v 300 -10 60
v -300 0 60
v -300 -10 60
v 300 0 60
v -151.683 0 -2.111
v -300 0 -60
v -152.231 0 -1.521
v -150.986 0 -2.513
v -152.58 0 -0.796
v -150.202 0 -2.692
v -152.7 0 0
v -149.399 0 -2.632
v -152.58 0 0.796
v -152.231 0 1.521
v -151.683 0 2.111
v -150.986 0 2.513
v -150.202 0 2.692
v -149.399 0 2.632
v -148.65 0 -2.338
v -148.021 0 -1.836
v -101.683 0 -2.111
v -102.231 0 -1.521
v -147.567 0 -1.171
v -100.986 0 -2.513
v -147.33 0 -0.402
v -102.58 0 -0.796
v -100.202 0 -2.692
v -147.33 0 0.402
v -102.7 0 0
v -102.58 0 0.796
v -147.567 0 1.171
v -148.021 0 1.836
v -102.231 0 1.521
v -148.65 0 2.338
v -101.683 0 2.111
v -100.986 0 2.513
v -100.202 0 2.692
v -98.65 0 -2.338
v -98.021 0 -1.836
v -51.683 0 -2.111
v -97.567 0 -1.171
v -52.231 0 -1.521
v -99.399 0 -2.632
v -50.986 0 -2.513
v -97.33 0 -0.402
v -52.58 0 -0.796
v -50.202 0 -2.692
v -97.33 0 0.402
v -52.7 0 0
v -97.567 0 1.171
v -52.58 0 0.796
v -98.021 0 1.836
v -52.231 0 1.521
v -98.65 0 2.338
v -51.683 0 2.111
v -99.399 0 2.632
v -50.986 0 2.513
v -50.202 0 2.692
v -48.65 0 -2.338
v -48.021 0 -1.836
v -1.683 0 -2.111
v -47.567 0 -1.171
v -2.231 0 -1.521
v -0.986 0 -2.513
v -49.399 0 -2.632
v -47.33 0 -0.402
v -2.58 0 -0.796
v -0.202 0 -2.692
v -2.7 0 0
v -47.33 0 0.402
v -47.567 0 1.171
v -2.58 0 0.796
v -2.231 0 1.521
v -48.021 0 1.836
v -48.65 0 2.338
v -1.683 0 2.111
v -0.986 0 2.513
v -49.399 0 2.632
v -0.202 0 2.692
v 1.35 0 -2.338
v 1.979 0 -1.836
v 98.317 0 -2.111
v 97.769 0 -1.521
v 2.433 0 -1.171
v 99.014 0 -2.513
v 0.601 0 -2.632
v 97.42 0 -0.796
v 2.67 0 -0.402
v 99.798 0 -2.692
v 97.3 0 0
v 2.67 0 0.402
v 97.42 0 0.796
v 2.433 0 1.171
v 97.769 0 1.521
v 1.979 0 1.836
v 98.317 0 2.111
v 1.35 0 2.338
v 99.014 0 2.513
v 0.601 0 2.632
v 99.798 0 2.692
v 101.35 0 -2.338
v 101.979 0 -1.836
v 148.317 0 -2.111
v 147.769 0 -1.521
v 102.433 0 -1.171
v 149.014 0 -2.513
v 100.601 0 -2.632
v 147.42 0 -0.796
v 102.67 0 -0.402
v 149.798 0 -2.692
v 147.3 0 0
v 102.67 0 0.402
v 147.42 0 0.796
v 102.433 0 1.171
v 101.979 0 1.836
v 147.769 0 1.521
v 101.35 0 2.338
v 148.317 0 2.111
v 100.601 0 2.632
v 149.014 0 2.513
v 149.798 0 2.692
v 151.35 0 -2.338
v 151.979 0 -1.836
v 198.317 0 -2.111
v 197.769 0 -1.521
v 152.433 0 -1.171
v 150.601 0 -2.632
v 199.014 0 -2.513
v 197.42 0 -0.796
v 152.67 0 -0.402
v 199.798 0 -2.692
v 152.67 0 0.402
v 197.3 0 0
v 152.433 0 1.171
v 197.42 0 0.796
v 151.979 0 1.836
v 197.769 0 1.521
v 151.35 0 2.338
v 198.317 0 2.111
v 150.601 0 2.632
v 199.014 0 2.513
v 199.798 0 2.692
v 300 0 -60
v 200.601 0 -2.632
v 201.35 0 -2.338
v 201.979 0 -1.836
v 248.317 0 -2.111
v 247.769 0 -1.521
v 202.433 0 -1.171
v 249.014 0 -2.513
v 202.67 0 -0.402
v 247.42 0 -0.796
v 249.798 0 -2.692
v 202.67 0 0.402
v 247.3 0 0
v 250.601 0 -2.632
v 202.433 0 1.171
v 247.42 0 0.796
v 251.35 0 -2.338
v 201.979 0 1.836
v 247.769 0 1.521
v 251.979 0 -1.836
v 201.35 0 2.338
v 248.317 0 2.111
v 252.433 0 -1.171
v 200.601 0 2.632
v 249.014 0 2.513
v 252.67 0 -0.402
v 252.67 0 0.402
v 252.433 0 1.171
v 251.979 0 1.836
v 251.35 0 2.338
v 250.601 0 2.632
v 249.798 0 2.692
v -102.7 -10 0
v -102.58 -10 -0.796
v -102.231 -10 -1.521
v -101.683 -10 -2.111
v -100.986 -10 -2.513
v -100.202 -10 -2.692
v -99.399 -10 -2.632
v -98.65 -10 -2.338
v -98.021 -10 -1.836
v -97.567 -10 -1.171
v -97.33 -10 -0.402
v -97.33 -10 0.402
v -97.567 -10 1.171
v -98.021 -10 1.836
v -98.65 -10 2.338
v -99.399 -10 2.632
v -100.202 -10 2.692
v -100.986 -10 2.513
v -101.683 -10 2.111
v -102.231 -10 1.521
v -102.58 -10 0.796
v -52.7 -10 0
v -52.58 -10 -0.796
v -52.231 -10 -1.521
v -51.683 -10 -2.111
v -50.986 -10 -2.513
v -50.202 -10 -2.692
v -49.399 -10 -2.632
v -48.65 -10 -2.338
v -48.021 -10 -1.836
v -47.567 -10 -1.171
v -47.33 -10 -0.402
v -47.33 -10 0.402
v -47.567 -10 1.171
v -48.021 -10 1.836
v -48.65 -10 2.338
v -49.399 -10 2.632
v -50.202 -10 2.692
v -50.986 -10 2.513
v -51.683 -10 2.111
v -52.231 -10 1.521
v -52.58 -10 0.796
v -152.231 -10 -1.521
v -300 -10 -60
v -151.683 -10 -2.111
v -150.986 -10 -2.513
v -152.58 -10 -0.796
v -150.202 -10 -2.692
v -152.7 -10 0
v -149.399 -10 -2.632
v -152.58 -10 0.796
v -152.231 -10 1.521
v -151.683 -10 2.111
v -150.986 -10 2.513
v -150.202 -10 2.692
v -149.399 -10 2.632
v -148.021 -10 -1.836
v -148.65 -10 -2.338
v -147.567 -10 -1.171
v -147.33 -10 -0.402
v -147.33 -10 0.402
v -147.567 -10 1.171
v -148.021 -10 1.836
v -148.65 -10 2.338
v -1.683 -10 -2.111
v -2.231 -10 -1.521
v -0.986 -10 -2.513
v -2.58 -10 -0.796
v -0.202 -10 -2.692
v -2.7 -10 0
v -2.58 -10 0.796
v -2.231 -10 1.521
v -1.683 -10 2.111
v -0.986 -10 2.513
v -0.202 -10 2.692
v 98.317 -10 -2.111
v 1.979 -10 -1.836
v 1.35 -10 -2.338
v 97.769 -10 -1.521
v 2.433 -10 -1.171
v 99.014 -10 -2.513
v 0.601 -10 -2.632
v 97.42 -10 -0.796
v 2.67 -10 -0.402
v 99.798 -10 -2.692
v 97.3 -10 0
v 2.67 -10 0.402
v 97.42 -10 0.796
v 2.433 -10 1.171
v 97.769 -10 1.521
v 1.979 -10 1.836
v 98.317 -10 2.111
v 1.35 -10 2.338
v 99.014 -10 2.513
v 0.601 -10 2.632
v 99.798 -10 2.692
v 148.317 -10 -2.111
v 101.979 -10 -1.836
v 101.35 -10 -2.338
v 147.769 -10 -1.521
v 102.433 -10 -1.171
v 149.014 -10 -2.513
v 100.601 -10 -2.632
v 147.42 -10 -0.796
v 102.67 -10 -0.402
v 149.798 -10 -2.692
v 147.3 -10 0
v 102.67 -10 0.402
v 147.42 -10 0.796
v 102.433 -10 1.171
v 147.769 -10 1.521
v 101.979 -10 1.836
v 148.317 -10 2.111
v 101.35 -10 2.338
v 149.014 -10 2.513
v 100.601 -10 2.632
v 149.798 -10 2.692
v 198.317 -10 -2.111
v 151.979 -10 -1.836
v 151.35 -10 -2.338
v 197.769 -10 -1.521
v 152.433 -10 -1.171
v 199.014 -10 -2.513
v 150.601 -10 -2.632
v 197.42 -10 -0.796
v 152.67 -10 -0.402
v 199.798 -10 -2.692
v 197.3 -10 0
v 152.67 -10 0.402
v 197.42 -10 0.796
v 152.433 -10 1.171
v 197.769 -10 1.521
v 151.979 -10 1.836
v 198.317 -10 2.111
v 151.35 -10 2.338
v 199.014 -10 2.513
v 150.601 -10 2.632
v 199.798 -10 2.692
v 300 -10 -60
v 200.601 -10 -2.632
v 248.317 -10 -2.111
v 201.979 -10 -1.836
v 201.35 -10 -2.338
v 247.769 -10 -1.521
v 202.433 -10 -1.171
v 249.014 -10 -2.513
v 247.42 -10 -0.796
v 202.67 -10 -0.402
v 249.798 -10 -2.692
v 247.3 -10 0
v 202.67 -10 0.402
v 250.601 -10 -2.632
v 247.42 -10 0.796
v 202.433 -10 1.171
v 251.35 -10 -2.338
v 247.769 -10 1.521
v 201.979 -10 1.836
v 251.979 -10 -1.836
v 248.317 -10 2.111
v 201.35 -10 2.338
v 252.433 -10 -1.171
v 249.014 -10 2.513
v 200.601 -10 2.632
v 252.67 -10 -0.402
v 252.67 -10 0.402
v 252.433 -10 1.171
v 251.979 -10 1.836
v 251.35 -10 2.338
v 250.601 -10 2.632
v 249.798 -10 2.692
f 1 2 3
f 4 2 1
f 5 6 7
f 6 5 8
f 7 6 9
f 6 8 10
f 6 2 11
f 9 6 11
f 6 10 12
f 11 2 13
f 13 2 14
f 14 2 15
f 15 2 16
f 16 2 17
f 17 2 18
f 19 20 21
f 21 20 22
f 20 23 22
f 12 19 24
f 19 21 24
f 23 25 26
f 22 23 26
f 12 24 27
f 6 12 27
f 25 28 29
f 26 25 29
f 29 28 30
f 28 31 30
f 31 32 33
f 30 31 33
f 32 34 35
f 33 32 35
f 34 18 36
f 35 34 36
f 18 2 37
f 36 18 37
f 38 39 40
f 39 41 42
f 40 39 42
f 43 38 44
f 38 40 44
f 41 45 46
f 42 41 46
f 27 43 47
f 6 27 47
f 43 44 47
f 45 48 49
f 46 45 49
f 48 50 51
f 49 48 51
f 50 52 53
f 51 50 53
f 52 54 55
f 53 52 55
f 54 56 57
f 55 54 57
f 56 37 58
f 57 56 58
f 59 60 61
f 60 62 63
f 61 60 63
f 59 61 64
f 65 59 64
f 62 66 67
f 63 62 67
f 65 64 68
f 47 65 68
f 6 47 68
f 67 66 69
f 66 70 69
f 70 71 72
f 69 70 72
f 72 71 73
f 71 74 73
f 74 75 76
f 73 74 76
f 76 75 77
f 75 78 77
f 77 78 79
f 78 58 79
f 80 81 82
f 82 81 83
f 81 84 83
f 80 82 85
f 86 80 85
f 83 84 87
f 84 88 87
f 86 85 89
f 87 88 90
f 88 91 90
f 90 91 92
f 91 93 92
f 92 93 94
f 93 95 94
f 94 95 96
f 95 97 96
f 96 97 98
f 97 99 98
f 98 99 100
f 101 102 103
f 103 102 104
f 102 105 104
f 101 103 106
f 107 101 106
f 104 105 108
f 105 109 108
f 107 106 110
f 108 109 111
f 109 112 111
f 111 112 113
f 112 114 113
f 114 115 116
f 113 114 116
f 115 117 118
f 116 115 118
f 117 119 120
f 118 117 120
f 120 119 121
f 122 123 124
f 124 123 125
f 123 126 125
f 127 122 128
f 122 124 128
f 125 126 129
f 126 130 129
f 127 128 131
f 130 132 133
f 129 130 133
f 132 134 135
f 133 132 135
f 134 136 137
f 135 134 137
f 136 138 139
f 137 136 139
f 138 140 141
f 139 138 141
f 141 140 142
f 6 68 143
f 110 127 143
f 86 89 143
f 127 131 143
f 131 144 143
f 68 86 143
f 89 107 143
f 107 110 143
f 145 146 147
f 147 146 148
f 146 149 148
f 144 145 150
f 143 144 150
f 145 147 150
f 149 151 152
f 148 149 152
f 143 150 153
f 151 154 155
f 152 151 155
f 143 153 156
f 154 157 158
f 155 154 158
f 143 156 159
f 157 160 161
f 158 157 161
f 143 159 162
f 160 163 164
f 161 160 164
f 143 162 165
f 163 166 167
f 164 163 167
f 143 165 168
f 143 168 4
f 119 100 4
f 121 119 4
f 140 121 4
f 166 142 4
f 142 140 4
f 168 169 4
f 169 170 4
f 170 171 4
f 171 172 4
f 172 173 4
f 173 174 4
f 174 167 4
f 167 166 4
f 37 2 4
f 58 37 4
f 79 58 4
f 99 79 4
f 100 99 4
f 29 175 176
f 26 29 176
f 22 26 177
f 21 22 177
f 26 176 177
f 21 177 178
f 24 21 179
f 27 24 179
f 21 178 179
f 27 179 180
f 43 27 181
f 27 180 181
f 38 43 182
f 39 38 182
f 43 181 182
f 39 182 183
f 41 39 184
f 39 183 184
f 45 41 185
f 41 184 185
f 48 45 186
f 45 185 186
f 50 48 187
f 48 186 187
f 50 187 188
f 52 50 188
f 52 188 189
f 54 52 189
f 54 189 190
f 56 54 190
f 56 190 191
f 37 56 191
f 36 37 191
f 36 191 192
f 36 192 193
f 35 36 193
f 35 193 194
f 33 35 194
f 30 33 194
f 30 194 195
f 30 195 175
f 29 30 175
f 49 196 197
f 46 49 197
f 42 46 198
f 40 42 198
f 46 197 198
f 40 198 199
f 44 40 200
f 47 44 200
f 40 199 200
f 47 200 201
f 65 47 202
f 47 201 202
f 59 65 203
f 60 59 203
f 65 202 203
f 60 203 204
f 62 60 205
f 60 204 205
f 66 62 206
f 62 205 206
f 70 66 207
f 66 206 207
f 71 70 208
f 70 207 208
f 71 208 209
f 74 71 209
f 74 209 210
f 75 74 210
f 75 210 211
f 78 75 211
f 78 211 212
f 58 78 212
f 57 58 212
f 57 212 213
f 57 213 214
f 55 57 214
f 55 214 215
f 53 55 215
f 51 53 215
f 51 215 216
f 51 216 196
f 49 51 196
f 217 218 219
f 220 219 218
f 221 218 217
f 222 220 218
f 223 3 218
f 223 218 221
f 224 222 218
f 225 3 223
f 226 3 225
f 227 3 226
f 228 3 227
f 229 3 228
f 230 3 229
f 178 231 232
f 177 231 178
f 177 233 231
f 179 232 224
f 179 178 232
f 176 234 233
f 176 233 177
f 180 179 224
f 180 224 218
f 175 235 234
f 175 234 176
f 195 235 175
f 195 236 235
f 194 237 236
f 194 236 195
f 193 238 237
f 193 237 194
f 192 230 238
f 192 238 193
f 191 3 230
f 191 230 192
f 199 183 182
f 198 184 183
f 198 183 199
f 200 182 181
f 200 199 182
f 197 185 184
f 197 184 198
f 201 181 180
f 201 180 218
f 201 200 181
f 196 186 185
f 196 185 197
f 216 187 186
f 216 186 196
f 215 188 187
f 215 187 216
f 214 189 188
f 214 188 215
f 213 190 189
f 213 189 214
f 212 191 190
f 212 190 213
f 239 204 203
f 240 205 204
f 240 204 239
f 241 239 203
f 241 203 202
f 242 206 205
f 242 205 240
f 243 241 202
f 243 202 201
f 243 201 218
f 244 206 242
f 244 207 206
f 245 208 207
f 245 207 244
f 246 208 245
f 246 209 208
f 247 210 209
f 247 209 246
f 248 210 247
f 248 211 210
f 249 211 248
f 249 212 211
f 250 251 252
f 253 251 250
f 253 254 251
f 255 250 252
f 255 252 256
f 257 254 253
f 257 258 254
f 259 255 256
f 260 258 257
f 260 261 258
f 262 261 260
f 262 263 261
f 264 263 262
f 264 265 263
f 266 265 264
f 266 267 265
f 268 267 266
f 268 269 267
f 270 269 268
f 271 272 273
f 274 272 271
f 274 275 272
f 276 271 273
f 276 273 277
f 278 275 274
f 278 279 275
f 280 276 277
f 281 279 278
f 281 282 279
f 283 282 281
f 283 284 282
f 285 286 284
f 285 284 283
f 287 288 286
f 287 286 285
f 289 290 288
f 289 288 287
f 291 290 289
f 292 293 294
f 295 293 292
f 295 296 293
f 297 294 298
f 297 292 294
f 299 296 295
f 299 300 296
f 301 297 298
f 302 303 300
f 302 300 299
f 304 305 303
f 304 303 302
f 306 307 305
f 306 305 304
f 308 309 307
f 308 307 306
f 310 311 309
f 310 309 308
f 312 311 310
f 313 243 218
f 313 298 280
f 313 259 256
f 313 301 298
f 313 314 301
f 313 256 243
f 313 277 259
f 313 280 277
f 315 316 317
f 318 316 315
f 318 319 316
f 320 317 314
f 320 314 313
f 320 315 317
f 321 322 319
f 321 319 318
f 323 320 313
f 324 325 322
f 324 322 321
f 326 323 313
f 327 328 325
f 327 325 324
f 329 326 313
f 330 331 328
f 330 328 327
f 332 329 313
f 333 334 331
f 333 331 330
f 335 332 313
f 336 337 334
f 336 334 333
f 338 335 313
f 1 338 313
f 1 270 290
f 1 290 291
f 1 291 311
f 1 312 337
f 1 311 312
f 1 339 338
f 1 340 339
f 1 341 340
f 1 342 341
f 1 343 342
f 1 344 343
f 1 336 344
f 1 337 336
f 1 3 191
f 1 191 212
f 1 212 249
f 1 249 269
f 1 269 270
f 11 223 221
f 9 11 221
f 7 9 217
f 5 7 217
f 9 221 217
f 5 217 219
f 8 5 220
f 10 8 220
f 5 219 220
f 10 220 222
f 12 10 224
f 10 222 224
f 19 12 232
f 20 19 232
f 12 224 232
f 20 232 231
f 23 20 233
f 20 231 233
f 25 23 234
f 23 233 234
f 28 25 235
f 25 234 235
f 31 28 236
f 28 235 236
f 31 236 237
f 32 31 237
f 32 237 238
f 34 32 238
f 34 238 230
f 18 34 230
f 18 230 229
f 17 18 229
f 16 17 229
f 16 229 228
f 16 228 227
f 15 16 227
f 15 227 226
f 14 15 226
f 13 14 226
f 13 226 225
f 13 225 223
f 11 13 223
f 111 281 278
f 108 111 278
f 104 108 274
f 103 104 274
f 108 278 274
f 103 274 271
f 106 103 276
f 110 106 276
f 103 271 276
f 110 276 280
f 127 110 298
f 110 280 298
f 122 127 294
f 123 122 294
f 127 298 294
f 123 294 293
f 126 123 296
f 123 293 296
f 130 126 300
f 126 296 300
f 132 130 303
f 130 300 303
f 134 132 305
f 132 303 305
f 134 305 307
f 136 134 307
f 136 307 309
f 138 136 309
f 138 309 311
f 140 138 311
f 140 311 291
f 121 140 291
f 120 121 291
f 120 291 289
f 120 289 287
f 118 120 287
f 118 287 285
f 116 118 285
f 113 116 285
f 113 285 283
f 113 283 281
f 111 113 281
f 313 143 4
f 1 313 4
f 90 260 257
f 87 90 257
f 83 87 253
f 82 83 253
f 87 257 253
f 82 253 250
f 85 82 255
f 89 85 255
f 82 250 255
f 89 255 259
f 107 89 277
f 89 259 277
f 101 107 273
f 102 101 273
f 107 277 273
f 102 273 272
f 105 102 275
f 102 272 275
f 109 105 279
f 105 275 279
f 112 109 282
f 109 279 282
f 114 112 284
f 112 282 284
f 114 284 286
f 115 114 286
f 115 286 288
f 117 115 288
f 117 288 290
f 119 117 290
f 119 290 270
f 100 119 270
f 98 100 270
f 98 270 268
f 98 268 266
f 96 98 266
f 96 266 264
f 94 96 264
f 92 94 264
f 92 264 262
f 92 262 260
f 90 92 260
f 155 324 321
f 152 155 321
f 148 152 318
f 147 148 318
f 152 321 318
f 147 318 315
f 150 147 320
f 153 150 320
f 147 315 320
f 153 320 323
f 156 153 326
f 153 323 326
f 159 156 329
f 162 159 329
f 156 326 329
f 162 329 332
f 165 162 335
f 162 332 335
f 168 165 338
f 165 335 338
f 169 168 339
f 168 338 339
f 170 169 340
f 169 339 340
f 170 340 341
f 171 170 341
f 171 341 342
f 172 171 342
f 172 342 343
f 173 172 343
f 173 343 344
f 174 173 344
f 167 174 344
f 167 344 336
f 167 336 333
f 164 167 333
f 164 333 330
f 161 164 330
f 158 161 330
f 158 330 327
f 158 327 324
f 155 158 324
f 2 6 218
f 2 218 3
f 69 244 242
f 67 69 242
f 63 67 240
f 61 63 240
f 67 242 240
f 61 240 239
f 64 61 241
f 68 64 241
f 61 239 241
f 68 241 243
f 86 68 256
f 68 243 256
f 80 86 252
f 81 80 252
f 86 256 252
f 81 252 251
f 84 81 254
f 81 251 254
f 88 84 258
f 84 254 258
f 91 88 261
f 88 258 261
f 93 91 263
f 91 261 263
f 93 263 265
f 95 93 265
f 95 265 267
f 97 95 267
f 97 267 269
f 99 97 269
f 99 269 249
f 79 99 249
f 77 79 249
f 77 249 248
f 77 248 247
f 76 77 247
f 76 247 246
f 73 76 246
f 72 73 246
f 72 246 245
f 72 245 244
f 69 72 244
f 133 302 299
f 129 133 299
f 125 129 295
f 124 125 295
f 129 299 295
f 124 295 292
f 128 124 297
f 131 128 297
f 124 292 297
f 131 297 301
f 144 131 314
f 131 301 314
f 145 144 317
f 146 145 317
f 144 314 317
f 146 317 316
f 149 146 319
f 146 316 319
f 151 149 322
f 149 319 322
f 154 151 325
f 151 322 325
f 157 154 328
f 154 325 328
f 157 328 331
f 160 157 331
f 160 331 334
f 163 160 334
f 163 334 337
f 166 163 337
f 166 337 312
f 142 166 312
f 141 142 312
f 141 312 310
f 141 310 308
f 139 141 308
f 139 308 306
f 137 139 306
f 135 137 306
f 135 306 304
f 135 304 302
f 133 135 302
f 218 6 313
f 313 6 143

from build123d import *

# Parameters (mm, degrees)
F0_W     = 600
F0_H     = 120
F1_DEPTH = 10
F2_D     = 5.4


with BuildPart() as f1:
    # F0 (on Front) → F1 (new body)
    with BuildSketch(Plane.XZ):
        Rectangle(F0_W, F0_H)
    extrude(amount=F1_DEPTH)

    # F2 (through all)
    with Locations(Plane(origin=(0, 0, 0), x_dir=(1, 0, 0), z_dir=(0, 1, 0))):
        with Locations((250, 0), (200, 0), (150, 0), (100, 0), (0, 0), (0, 0), (-50, 0), (-100, 0), (-150, 0)):
            Hole(F2_D / 2)


solid = f1.part
